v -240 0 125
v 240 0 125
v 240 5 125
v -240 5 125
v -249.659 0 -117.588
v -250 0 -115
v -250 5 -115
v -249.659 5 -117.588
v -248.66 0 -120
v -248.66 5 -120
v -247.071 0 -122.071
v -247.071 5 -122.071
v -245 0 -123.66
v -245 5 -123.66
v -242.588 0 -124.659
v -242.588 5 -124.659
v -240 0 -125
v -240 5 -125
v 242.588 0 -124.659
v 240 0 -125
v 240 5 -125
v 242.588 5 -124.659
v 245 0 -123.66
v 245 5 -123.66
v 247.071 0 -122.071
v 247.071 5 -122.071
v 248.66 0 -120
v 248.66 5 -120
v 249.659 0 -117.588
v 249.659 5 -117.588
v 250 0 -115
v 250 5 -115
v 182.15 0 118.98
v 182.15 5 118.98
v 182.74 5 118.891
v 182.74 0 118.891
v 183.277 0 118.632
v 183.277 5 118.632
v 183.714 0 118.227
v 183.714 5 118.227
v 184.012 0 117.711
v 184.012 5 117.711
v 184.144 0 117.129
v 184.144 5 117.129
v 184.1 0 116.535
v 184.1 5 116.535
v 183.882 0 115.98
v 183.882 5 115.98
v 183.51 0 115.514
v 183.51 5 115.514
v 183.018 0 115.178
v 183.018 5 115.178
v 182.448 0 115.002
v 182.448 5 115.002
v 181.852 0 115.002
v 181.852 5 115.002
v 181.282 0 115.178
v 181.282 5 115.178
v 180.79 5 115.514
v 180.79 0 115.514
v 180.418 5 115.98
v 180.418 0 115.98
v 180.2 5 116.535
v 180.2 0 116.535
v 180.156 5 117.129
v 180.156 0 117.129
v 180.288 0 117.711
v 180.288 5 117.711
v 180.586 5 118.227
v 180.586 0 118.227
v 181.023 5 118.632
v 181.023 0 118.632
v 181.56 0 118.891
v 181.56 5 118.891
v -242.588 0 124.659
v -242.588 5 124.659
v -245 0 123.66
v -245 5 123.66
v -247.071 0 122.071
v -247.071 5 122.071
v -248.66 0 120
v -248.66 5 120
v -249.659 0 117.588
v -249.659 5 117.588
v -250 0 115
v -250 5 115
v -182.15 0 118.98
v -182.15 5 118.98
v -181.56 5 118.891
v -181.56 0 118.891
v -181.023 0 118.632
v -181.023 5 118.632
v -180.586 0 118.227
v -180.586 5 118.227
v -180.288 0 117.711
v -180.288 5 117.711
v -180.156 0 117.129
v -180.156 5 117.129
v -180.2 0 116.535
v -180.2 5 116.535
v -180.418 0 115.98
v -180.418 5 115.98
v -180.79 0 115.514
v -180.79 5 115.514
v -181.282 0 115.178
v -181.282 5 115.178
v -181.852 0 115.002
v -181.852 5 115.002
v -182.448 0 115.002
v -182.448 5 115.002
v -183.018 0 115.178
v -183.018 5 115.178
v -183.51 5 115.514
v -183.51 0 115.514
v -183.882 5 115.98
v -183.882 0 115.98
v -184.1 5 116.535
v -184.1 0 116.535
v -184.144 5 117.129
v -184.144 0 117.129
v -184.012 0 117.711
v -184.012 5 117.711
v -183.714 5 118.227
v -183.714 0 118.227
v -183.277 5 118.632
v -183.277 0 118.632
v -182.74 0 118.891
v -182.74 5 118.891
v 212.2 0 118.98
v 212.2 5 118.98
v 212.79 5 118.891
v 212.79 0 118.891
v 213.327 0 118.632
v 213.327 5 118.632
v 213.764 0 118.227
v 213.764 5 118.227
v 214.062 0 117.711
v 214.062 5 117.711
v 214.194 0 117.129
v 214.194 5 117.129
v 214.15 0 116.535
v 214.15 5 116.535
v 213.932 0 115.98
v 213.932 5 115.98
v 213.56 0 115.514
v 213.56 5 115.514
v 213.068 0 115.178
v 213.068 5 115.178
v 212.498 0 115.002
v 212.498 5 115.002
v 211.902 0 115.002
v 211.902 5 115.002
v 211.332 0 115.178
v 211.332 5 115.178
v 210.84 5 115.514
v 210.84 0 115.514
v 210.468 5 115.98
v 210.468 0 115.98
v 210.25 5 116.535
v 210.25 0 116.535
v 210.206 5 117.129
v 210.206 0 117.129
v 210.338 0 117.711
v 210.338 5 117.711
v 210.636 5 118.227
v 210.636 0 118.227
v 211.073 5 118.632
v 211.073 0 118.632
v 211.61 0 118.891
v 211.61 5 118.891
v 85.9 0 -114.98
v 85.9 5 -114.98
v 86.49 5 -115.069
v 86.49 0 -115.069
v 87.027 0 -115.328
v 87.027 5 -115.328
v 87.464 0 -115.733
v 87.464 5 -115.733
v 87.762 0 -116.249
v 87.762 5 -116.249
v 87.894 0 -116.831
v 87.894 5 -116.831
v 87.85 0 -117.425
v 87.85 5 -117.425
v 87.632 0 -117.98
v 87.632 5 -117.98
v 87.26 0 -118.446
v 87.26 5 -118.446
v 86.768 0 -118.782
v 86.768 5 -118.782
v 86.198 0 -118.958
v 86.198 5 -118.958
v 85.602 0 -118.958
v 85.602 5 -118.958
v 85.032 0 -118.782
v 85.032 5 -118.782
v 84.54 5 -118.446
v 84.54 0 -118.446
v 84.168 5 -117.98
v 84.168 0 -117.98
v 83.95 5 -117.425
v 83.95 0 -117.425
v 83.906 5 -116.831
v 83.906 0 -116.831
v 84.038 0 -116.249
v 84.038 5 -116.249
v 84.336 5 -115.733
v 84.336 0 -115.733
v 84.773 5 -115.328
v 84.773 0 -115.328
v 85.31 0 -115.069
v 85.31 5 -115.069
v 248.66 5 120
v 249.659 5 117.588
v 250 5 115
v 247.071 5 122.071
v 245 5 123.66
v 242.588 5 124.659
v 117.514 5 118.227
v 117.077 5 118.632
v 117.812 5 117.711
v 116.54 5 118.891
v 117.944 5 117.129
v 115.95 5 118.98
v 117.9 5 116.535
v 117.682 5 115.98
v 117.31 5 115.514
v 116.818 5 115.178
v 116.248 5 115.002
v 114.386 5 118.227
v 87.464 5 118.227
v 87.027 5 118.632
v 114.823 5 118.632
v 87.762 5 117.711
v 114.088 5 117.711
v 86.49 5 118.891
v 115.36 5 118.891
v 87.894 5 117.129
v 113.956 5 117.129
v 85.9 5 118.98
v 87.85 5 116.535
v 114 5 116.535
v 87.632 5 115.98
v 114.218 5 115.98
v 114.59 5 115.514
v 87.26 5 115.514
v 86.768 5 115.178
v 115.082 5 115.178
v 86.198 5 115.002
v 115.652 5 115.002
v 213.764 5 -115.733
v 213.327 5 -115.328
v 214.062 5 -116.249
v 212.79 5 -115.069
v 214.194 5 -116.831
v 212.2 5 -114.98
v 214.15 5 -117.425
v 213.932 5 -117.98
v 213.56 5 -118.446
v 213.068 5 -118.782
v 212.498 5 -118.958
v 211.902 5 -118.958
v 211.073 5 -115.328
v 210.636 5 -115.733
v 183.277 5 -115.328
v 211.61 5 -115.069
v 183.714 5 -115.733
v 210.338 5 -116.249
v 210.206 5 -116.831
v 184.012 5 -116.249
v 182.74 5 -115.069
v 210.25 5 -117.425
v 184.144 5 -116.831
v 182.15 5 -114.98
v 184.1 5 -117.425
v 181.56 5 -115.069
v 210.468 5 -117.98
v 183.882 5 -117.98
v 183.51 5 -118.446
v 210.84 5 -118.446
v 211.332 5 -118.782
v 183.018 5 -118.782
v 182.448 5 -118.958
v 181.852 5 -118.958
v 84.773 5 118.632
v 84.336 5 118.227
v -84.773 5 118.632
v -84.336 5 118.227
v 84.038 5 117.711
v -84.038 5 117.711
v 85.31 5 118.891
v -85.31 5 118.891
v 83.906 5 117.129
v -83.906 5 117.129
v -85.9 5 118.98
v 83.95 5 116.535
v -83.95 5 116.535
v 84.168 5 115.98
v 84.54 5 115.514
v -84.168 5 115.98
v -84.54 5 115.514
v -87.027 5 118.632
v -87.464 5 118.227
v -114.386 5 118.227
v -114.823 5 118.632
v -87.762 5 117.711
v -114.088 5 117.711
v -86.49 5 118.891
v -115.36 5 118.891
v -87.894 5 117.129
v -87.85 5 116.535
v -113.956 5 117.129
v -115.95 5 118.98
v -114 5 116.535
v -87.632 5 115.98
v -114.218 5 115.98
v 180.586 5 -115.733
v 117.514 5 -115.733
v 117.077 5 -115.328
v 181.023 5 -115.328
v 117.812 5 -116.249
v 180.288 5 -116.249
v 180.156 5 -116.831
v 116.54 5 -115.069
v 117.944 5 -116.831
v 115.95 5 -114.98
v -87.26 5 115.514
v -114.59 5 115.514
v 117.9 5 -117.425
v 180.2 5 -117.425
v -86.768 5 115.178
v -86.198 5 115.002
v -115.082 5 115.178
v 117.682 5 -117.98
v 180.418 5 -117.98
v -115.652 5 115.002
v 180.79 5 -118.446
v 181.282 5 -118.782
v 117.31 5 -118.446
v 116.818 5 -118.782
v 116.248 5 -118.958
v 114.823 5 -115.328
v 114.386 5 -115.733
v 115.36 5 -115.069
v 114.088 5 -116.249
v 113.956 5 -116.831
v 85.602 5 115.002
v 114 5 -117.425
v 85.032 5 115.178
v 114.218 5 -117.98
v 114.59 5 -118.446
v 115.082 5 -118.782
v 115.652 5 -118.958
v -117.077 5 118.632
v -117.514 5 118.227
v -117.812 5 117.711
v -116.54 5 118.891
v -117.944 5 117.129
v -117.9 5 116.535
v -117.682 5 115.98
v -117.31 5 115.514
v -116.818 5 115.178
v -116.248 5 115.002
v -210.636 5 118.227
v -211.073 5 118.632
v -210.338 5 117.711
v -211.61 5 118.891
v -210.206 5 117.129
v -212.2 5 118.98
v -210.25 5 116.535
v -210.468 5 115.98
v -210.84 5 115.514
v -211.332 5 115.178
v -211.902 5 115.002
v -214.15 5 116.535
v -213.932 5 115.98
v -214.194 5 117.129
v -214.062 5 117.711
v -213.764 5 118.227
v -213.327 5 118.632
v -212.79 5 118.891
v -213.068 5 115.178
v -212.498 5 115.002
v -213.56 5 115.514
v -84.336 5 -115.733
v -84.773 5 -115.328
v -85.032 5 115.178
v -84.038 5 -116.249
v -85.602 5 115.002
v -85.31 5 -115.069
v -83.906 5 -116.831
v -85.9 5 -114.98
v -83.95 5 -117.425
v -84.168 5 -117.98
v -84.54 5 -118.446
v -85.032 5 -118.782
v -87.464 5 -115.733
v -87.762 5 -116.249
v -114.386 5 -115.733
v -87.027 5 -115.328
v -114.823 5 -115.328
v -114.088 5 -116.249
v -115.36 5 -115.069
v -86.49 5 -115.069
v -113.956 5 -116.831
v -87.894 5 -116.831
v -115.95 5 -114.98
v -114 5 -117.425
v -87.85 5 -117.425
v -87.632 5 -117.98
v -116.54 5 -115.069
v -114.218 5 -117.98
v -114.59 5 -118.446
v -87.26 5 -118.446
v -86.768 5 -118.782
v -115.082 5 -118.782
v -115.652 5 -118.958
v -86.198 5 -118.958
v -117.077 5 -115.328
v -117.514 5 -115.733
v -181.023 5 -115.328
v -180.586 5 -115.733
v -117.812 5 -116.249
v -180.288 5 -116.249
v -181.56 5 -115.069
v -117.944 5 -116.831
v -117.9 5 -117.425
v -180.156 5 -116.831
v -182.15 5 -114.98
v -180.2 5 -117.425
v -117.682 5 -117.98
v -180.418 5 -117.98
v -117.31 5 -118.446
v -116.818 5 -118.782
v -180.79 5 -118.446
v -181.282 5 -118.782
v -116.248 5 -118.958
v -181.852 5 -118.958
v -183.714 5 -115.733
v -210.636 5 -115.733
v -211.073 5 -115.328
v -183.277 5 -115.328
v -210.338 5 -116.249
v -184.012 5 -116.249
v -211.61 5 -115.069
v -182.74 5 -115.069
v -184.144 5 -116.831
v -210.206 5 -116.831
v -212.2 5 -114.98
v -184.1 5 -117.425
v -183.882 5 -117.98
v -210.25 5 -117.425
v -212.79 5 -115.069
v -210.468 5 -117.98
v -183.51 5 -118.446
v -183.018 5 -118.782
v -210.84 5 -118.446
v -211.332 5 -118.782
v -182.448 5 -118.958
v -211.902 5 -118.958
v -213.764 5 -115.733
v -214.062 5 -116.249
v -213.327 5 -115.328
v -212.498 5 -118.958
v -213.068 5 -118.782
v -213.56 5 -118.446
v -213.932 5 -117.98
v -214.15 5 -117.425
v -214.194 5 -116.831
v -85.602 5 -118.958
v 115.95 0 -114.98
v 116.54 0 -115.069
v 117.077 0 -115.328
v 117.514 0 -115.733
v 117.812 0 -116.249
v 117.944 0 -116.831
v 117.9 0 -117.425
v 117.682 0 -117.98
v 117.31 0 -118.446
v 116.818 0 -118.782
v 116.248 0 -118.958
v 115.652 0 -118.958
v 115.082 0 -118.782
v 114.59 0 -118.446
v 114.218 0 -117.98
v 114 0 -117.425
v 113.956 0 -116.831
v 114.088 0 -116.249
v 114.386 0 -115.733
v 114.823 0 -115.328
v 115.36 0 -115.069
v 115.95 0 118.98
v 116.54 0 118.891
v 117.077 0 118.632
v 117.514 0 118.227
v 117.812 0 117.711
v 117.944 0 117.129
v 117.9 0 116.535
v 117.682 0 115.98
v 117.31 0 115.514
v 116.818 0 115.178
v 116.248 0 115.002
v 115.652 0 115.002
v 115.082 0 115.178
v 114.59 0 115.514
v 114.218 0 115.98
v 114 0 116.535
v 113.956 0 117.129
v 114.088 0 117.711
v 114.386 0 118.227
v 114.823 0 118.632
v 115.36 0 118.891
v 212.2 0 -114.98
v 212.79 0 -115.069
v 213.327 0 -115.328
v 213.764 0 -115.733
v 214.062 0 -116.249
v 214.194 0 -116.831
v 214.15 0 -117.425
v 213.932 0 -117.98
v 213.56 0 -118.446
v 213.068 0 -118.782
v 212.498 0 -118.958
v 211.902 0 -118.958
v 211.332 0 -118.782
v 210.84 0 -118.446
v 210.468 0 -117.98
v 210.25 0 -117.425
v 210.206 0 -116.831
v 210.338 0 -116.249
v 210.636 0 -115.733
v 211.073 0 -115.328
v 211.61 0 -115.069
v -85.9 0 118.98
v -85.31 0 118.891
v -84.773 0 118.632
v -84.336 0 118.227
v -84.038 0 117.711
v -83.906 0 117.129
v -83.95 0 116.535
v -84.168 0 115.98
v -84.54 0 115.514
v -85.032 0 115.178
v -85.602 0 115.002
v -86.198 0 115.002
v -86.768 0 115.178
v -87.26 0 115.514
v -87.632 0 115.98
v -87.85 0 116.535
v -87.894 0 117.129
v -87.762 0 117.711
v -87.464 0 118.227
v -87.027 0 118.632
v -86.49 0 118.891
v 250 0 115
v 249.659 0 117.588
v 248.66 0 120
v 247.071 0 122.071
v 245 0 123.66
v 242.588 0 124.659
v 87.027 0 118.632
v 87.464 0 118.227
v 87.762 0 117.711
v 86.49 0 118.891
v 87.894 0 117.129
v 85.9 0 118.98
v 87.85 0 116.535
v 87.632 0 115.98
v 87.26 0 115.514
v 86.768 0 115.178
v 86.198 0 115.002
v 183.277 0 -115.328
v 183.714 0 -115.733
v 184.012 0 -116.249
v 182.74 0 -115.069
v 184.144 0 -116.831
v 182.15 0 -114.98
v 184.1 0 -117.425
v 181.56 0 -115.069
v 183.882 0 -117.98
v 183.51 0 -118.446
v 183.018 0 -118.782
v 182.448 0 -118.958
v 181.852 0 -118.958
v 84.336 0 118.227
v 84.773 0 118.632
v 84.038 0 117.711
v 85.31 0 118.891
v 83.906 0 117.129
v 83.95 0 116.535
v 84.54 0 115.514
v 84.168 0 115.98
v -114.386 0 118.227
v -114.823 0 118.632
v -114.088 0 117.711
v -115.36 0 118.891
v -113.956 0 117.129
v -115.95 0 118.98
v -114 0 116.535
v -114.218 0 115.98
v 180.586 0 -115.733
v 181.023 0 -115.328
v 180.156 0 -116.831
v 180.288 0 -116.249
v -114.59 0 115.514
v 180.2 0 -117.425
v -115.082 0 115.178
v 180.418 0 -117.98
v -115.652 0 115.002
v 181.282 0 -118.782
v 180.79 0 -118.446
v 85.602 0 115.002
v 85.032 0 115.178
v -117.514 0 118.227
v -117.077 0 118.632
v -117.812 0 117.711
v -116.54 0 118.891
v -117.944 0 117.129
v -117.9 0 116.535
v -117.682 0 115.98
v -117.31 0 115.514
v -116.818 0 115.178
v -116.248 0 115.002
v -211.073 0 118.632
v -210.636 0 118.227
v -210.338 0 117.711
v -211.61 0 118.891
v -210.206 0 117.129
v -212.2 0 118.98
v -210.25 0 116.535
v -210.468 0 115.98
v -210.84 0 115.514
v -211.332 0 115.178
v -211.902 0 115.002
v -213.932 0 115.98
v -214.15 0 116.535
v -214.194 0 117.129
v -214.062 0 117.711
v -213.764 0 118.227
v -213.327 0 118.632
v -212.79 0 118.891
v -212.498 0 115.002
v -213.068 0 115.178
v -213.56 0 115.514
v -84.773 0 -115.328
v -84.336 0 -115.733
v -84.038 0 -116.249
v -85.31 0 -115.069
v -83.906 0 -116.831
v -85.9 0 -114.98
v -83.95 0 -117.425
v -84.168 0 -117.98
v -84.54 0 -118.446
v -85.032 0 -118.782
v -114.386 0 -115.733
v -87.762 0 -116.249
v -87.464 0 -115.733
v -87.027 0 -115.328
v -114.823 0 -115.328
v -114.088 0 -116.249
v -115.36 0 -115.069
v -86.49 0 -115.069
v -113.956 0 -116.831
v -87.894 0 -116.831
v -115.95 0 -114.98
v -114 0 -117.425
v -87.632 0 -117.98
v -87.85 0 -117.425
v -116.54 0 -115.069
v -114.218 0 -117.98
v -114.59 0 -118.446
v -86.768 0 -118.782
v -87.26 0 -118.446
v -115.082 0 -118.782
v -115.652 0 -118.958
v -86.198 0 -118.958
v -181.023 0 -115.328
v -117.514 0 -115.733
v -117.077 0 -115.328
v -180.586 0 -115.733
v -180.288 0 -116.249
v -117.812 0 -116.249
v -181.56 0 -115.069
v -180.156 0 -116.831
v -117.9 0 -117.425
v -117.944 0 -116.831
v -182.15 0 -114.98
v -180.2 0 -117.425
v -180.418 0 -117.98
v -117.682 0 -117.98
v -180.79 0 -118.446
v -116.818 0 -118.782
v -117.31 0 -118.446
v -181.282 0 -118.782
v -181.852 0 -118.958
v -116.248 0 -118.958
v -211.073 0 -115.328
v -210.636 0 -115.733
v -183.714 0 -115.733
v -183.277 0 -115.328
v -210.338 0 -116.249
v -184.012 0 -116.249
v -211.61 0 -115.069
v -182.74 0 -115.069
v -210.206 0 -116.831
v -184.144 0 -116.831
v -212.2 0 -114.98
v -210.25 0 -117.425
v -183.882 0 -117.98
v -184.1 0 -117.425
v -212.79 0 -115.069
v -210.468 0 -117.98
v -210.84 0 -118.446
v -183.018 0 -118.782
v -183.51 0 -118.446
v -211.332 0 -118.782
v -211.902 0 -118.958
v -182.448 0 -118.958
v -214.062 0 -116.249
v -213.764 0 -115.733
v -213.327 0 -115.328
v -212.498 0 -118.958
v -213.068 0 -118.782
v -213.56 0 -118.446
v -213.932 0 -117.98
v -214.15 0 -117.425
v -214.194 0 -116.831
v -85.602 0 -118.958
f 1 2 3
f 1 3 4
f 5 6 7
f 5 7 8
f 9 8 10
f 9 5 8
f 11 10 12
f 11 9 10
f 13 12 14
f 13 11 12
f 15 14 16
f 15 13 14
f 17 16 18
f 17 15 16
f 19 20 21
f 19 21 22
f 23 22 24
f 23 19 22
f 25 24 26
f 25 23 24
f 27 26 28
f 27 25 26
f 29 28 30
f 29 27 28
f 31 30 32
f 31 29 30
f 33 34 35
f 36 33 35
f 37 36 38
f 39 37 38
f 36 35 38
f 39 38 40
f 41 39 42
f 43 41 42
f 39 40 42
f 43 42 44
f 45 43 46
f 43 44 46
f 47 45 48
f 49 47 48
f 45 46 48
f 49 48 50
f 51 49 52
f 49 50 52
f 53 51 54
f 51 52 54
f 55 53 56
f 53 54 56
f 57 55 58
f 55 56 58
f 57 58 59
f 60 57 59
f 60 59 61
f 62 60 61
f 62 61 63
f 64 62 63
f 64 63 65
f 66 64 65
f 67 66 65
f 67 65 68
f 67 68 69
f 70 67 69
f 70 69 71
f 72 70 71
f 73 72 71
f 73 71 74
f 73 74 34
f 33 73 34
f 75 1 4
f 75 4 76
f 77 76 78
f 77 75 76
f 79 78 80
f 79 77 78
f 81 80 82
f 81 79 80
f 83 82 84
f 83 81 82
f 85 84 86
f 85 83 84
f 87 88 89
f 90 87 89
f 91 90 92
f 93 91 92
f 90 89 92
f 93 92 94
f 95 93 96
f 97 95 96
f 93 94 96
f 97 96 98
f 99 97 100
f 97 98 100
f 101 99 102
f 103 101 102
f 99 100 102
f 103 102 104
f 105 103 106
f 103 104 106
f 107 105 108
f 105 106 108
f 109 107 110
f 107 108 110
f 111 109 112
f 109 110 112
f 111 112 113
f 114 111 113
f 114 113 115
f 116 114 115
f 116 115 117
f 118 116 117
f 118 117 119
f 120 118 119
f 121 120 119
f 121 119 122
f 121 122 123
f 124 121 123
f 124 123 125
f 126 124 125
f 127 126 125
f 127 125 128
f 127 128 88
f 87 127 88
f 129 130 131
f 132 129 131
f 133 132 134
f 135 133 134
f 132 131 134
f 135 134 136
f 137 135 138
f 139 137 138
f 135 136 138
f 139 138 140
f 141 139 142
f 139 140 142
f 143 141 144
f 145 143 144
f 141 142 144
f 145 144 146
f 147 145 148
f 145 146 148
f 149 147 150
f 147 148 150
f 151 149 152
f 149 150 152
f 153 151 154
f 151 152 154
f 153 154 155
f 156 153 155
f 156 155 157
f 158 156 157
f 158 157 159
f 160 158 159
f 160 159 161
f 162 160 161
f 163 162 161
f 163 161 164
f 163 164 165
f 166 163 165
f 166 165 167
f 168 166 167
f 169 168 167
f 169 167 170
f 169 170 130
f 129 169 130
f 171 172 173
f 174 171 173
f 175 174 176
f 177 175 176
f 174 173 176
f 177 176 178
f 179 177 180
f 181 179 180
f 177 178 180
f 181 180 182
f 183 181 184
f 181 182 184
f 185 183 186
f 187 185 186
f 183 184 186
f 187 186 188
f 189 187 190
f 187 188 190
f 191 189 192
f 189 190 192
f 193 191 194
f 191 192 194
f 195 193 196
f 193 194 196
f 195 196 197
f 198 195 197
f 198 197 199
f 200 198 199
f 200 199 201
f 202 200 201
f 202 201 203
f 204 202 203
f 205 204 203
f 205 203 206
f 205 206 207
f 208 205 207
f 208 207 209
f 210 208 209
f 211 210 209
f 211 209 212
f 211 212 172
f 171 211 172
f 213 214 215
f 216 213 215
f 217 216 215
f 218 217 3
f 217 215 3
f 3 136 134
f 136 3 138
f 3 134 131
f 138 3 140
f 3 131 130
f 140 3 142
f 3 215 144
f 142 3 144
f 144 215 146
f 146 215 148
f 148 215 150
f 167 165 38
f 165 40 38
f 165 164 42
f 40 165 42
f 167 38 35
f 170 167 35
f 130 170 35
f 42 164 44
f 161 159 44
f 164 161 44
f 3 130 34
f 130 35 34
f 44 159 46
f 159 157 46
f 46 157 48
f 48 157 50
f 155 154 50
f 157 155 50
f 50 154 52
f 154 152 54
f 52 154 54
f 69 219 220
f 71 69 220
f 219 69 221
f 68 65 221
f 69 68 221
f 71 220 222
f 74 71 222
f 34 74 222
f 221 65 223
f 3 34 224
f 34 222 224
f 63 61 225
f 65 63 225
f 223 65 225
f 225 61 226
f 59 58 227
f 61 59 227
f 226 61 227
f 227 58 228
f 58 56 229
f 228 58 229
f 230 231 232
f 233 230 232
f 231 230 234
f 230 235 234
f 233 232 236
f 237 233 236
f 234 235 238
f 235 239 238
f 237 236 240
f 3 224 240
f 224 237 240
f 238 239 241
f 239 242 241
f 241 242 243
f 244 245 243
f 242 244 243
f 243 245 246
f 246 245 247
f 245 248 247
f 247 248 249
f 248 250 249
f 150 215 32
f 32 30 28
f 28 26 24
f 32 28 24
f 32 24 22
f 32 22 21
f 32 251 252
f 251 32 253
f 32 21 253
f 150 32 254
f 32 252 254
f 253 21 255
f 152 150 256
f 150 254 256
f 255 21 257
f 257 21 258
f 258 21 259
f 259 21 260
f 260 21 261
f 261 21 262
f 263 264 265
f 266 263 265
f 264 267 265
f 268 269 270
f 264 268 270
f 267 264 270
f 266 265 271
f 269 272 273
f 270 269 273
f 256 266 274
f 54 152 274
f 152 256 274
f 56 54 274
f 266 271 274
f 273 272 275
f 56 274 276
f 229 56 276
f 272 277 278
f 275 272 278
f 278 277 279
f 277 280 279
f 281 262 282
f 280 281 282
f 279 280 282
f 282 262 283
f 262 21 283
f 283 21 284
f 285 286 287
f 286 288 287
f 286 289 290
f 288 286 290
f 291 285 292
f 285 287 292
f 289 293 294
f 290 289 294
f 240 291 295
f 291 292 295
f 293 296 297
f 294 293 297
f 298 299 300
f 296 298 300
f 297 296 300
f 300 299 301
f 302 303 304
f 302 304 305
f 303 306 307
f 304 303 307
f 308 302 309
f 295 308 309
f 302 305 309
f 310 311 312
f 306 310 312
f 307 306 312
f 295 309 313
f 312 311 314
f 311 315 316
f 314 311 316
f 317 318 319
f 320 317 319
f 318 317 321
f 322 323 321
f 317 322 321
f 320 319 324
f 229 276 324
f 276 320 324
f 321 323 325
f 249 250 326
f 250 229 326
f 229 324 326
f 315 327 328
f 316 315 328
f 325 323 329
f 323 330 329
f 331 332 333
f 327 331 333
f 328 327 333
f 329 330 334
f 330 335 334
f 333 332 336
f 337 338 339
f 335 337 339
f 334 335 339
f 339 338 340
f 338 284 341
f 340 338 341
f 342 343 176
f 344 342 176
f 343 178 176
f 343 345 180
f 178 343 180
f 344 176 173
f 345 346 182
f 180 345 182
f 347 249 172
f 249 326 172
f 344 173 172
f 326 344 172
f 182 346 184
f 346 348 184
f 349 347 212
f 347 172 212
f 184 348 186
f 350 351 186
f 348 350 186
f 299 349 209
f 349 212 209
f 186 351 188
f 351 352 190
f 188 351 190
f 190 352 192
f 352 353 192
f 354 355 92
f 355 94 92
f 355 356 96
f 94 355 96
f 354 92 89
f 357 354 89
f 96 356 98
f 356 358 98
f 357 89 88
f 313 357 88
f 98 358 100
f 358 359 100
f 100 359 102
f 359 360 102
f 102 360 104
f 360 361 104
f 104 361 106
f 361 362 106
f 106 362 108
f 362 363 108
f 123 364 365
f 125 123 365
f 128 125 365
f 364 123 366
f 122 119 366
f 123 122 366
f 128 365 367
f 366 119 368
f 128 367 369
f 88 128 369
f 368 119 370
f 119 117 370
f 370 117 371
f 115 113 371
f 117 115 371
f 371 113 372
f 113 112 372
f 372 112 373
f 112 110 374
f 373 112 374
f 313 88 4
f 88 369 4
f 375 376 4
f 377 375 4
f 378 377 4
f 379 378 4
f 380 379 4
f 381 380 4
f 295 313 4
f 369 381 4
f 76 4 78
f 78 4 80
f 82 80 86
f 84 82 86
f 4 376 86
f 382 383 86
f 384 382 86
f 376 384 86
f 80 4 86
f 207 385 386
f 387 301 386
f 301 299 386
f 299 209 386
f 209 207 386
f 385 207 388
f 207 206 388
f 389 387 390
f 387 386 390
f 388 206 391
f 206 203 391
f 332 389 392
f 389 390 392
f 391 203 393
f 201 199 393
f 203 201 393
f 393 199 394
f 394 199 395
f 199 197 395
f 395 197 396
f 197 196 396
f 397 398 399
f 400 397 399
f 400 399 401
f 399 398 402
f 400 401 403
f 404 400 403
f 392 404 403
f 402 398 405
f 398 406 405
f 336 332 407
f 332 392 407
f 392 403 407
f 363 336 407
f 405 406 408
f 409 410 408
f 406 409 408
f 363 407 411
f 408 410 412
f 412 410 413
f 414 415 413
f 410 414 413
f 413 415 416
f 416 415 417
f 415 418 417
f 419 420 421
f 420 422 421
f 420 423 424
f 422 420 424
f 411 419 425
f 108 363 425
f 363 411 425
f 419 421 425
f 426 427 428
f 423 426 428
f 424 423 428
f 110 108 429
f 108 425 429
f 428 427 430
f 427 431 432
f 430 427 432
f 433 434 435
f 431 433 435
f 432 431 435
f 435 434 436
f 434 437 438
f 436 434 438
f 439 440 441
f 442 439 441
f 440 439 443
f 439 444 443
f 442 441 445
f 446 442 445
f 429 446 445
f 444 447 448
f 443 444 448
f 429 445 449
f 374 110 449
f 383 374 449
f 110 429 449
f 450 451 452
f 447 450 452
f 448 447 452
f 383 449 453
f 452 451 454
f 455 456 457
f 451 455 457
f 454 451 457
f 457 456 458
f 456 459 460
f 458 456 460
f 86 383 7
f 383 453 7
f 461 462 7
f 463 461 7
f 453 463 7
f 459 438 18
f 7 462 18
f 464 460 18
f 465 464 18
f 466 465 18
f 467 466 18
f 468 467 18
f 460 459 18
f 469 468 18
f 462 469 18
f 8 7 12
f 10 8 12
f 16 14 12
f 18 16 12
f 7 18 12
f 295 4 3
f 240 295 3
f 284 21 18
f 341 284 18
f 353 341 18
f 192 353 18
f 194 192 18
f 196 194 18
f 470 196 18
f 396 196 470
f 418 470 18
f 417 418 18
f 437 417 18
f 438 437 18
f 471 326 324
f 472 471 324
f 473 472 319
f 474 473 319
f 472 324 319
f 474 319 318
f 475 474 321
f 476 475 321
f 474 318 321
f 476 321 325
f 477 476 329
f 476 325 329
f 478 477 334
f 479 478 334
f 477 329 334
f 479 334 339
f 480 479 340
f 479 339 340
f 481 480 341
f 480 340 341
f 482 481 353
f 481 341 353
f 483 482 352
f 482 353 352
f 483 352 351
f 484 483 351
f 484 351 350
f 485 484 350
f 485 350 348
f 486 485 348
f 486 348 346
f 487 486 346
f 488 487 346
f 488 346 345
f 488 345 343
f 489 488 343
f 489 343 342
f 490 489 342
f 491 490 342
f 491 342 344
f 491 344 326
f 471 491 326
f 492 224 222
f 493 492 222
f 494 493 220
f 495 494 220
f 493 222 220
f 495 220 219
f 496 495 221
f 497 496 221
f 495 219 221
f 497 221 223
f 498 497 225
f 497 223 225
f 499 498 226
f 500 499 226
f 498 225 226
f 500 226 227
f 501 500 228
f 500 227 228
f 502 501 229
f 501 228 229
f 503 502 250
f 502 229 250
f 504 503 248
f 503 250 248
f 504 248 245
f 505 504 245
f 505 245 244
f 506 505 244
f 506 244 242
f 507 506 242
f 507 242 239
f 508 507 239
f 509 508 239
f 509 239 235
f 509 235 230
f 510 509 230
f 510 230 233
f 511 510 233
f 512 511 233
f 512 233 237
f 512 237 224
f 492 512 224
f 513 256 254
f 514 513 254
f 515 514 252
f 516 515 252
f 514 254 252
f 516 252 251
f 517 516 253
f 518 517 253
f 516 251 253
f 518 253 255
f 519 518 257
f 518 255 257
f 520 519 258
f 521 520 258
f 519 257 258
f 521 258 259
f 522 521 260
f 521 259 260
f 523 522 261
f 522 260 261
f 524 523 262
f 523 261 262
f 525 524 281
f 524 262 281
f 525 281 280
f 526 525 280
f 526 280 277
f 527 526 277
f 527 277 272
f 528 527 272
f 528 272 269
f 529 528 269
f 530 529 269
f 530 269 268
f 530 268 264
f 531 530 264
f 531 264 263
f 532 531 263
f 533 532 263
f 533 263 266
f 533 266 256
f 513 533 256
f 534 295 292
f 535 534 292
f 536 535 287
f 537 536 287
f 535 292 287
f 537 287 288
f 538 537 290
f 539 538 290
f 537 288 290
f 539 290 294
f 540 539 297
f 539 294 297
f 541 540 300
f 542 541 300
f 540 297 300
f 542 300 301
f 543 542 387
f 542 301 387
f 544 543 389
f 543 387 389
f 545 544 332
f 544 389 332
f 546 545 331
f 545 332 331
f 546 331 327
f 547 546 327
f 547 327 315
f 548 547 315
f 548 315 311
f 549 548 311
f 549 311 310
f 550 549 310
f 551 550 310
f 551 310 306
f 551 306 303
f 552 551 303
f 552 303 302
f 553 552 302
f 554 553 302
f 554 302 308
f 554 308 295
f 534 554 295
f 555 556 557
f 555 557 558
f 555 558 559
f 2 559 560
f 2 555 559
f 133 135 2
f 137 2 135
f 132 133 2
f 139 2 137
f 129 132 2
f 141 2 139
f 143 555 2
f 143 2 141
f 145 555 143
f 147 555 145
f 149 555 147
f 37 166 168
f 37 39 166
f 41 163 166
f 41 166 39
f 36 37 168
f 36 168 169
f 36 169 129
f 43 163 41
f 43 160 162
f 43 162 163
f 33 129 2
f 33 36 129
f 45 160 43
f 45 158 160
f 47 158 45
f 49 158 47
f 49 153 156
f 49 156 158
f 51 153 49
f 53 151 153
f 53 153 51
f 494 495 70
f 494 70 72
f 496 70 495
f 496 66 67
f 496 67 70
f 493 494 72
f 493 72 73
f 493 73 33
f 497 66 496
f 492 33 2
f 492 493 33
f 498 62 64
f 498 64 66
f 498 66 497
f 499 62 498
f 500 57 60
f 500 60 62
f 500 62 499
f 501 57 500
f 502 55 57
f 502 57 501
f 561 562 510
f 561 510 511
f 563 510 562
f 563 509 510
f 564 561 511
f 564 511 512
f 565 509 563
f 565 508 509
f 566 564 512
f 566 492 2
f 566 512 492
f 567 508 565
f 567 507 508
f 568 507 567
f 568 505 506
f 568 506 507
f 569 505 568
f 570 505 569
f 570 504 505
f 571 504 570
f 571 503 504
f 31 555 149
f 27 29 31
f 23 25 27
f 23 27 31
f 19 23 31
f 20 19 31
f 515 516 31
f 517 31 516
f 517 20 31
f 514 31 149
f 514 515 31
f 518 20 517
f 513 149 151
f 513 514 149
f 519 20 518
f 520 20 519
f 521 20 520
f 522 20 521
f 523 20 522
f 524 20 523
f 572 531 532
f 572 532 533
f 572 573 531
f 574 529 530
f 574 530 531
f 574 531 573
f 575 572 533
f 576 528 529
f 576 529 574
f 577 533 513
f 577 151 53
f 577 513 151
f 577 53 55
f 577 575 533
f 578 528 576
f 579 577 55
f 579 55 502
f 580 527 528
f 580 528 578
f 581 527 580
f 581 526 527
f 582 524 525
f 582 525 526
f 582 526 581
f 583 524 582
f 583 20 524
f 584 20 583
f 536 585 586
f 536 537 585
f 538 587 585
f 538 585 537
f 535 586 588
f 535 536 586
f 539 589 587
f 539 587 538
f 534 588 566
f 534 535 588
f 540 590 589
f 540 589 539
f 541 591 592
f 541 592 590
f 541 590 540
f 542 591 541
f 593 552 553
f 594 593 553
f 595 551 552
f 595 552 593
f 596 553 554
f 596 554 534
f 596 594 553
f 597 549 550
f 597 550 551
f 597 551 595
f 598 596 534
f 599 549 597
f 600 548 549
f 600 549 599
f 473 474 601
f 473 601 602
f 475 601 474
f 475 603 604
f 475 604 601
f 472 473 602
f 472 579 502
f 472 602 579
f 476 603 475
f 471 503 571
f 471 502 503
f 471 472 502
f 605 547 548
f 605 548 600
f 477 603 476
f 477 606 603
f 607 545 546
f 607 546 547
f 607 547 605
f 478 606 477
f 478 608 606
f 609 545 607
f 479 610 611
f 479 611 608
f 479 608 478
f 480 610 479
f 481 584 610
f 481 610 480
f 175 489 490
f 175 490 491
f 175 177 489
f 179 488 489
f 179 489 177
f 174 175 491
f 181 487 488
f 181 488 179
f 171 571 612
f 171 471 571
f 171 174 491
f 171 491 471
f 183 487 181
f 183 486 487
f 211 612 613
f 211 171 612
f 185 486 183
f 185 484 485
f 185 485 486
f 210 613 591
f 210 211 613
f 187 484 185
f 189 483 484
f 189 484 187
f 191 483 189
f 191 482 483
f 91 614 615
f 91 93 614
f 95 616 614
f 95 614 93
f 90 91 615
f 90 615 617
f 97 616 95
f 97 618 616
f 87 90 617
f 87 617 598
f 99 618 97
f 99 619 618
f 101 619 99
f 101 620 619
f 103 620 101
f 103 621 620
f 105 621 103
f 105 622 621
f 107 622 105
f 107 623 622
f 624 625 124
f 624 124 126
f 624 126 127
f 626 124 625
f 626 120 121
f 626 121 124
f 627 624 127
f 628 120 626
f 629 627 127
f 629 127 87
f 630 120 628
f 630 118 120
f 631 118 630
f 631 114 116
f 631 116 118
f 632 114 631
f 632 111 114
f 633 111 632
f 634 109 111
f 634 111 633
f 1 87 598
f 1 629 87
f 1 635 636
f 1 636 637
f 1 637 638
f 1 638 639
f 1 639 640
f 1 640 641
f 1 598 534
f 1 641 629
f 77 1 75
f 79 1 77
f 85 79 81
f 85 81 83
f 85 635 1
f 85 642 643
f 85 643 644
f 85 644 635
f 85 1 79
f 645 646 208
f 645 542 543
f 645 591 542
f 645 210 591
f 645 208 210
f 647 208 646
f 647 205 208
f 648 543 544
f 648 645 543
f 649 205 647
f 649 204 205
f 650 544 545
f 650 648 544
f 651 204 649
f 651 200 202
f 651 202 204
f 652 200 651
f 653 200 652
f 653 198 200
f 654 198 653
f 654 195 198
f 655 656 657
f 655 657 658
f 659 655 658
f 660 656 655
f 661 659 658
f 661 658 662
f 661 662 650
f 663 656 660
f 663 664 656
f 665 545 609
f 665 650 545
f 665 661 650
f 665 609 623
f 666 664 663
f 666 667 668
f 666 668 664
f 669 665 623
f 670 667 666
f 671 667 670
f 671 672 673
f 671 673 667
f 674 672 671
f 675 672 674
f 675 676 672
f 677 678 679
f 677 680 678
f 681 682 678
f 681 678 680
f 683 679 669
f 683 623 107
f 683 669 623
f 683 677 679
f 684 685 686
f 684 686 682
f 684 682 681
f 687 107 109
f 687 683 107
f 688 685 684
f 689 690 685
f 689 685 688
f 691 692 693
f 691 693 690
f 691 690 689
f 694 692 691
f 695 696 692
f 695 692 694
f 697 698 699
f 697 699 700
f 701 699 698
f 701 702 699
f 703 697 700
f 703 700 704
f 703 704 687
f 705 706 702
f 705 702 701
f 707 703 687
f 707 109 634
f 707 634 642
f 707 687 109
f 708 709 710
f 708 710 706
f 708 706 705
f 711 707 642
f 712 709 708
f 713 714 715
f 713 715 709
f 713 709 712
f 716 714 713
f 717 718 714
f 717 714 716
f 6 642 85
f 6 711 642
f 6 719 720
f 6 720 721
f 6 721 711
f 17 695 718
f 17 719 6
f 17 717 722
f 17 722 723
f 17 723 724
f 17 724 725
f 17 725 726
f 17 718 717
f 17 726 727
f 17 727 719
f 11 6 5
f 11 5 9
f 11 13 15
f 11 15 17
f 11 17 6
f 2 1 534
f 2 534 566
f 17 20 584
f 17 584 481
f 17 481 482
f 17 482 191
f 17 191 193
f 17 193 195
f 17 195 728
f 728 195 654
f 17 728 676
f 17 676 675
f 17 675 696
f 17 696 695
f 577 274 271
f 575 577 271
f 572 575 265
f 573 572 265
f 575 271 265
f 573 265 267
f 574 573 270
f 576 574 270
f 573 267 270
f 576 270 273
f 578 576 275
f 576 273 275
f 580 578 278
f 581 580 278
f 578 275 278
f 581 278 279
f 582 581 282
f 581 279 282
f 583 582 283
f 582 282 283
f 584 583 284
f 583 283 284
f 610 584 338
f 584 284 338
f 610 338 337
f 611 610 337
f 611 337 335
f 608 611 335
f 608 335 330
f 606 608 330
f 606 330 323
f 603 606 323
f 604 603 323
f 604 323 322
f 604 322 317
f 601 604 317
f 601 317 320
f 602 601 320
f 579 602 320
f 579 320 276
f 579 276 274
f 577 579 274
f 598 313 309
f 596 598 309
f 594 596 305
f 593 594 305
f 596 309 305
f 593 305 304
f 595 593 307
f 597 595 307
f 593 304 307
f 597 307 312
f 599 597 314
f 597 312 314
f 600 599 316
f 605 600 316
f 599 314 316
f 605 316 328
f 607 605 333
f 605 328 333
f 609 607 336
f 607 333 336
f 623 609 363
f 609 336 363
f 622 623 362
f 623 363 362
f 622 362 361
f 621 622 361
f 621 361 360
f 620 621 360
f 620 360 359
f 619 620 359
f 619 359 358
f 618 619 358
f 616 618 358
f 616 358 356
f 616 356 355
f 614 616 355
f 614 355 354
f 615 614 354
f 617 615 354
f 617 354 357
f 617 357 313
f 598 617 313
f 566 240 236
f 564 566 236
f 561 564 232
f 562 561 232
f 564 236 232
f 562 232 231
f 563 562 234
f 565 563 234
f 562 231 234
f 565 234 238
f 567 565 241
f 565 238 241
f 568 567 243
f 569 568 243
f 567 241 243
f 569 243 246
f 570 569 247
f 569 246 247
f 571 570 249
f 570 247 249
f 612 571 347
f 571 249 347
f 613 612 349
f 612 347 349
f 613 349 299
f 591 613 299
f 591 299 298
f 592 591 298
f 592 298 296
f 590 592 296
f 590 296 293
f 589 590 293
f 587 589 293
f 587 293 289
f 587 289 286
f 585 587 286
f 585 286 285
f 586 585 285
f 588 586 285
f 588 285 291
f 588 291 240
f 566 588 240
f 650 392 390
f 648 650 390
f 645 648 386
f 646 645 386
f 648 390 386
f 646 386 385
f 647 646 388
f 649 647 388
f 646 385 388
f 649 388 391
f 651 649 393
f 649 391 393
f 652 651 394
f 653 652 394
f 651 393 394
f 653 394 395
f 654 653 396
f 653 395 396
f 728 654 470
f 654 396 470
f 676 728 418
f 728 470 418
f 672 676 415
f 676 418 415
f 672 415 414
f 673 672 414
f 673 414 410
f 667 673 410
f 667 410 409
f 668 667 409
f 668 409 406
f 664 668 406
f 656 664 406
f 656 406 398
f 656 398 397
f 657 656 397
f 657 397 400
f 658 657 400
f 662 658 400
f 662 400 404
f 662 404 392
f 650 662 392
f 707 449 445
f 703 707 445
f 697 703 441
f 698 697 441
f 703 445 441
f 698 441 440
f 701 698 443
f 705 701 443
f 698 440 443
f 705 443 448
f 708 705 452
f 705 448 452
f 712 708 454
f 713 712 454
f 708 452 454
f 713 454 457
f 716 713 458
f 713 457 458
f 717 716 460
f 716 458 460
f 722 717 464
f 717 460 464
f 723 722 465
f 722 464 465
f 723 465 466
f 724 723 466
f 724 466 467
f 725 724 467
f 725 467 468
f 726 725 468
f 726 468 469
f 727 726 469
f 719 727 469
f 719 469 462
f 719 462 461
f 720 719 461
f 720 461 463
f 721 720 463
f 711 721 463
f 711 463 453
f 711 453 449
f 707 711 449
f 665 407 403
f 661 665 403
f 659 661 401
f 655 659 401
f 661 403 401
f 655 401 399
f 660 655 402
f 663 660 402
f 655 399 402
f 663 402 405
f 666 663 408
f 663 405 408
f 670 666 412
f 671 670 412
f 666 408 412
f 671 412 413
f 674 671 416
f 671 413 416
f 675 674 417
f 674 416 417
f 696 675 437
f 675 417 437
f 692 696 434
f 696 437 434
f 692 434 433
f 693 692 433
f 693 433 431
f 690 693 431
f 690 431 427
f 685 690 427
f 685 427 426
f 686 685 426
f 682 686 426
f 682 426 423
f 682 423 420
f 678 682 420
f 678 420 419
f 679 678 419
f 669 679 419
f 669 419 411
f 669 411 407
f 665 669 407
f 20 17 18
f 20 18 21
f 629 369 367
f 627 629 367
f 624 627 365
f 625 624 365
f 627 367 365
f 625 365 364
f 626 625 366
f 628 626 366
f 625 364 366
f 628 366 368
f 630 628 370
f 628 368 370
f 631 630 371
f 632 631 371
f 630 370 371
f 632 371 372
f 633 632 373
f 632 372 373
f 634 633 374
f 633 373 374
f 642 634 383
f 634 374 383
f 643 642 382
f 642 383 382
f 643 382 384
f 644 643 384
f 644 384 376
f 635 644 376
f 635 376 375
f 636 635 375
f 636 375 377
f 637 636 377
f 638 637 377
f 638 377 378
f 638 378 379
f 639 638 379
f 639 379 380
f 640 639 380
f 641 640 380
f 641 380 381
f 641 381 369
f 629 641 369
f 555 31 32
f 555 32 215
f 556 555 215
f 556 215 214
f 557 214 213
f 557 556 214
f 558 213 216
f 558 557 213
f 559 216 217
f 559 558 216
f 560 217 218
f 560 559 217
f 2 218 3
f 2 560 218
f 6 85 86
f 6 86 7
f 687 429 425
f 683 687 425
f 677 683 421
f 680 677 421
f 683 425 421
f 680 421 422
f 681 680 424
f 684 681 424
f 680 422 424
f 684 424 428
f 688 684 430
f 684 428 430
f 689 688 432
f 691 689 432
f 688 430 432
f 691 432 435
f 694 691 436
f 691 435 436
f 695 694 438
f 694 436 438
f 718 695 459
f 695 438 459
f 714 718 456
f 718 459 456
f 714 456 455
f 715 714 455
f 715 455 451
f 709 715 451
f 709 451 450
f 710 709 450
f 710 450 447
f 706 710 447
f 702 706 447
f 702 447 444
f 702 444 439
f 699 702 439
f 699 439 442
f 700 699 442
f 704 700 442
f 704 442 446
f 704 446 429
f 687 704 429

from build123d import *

# Parameters (mm, degrees)
SALIENTE_EXTRUIR1_DEPTH = 5
CROQUIS2_R              = 2
CORTAR_EXTRUIR1_DEPTH   = 10


with BuildPart() as part:
    # Croquis1 → Saliente-Extruir1 (new body)
    with BuildSketch(Plane(origin=(0, 0, 0), x_dir=(1, 0, 0), z_dir=(0, 1, 0))):
        with BuildLine():
            Line((240, -125), (-240, -125))
            ThreePointArc((-240, -125), (-247.071067812, -122.071067812), (-250, -115))
            Line((-250, -115), (-250, 115))
            ThreePointArc((-250, 115), (-247.071067812, 122.071067812), (-240, 125))
            Line((-240, 125), (240, 125))
            ThreePointArc((240, 125), (247.071067812, 122.071067812), (250, 115))
            Line((250, 115), (250, -115))
            ThreePointArc((250, -115), (247.071067812, -122.071067812), (240, -125))
        make_face()
    extrude(amount=SALIENTE_EXTRUIR1_DEPTH)

    # Croquis2 → Cortar-Extruir1 (cut)
    with BuildSketch(Plane(origin=(0, 5, 0), x_dir=(1, 0, 0), z_dir=(0, 1, 0))):
        with Locations(Location((-212.2, -116.98, 0), (0, 0, 270))):
            Circle(CROQUIS2_R)
        with Locations(Location((-182.15, -116.98, 0), (0, 0, 270))):
            Circle(CROQUIS2_R)
        with Locations(Location((-85.9, -116.98, 0), (0, 0, 270))):
            Circle(CROQUIS2_R)
        with Locations(Location((-115.95, -116.98, 0), (0, 0, 270))):
            Circle(CROQUIS2_R)
        with Locations(Location((212.2, -116.98, 0), (0, 0, 270))):
            Circle(CROQUIS2_R)
        with Locations(Location((182.15, -116.98, 0), (0, 0, 270))):
            Circle(CROQUIS2_R)
        with Locations(Location((115.95, -116.98, 0), (0, 0, 270))):
            Circle(CROQUIS2_R)
        with Locations(Location((85.9, -116.98, 0), (0, 0, 270))):
            Circle(CROQUIS2_R)
        with Locations(Location((212.2, 116.98, 0), (0, 0, 270))):
            Circle(CROQUIS2_R)
        with Locations(Location((182.15, 116.98, 0), (0, 0, 270))):
            Circle(CROQUIS2_R)
        with Locations(Location((115.95, 116.98, 0), (0, 0, 270))):
            Circle(CROQUIS2_R)
        with Locations(Location((85.9, 116.98, 0), (0, 0, 270))):
            Circle(CROQUIS2_R)
        with Locations(Location((-182.15, 116.98, 0), (0, 0, 270))):
            Circle(CROQUIS2_R)
        with Locations(Location((-212.2, 116.98, 0), (0, 0, 270))):
            Circle(CROQUIS2_R)
        with Locations(Location((-85.9, 116.98, 0), (0, 0, 270))):
            Circle(CROQUIS2_R)
        with Locations(Location((-115.95, 116.98, 0), (0, 0, 270))):
            Circle(CROQUIS2_R)
    extrude(amount=-CORTAR_EXTRUIR1_DEPTH, mode=Mode.SUBTRACT)


solid = part.part
